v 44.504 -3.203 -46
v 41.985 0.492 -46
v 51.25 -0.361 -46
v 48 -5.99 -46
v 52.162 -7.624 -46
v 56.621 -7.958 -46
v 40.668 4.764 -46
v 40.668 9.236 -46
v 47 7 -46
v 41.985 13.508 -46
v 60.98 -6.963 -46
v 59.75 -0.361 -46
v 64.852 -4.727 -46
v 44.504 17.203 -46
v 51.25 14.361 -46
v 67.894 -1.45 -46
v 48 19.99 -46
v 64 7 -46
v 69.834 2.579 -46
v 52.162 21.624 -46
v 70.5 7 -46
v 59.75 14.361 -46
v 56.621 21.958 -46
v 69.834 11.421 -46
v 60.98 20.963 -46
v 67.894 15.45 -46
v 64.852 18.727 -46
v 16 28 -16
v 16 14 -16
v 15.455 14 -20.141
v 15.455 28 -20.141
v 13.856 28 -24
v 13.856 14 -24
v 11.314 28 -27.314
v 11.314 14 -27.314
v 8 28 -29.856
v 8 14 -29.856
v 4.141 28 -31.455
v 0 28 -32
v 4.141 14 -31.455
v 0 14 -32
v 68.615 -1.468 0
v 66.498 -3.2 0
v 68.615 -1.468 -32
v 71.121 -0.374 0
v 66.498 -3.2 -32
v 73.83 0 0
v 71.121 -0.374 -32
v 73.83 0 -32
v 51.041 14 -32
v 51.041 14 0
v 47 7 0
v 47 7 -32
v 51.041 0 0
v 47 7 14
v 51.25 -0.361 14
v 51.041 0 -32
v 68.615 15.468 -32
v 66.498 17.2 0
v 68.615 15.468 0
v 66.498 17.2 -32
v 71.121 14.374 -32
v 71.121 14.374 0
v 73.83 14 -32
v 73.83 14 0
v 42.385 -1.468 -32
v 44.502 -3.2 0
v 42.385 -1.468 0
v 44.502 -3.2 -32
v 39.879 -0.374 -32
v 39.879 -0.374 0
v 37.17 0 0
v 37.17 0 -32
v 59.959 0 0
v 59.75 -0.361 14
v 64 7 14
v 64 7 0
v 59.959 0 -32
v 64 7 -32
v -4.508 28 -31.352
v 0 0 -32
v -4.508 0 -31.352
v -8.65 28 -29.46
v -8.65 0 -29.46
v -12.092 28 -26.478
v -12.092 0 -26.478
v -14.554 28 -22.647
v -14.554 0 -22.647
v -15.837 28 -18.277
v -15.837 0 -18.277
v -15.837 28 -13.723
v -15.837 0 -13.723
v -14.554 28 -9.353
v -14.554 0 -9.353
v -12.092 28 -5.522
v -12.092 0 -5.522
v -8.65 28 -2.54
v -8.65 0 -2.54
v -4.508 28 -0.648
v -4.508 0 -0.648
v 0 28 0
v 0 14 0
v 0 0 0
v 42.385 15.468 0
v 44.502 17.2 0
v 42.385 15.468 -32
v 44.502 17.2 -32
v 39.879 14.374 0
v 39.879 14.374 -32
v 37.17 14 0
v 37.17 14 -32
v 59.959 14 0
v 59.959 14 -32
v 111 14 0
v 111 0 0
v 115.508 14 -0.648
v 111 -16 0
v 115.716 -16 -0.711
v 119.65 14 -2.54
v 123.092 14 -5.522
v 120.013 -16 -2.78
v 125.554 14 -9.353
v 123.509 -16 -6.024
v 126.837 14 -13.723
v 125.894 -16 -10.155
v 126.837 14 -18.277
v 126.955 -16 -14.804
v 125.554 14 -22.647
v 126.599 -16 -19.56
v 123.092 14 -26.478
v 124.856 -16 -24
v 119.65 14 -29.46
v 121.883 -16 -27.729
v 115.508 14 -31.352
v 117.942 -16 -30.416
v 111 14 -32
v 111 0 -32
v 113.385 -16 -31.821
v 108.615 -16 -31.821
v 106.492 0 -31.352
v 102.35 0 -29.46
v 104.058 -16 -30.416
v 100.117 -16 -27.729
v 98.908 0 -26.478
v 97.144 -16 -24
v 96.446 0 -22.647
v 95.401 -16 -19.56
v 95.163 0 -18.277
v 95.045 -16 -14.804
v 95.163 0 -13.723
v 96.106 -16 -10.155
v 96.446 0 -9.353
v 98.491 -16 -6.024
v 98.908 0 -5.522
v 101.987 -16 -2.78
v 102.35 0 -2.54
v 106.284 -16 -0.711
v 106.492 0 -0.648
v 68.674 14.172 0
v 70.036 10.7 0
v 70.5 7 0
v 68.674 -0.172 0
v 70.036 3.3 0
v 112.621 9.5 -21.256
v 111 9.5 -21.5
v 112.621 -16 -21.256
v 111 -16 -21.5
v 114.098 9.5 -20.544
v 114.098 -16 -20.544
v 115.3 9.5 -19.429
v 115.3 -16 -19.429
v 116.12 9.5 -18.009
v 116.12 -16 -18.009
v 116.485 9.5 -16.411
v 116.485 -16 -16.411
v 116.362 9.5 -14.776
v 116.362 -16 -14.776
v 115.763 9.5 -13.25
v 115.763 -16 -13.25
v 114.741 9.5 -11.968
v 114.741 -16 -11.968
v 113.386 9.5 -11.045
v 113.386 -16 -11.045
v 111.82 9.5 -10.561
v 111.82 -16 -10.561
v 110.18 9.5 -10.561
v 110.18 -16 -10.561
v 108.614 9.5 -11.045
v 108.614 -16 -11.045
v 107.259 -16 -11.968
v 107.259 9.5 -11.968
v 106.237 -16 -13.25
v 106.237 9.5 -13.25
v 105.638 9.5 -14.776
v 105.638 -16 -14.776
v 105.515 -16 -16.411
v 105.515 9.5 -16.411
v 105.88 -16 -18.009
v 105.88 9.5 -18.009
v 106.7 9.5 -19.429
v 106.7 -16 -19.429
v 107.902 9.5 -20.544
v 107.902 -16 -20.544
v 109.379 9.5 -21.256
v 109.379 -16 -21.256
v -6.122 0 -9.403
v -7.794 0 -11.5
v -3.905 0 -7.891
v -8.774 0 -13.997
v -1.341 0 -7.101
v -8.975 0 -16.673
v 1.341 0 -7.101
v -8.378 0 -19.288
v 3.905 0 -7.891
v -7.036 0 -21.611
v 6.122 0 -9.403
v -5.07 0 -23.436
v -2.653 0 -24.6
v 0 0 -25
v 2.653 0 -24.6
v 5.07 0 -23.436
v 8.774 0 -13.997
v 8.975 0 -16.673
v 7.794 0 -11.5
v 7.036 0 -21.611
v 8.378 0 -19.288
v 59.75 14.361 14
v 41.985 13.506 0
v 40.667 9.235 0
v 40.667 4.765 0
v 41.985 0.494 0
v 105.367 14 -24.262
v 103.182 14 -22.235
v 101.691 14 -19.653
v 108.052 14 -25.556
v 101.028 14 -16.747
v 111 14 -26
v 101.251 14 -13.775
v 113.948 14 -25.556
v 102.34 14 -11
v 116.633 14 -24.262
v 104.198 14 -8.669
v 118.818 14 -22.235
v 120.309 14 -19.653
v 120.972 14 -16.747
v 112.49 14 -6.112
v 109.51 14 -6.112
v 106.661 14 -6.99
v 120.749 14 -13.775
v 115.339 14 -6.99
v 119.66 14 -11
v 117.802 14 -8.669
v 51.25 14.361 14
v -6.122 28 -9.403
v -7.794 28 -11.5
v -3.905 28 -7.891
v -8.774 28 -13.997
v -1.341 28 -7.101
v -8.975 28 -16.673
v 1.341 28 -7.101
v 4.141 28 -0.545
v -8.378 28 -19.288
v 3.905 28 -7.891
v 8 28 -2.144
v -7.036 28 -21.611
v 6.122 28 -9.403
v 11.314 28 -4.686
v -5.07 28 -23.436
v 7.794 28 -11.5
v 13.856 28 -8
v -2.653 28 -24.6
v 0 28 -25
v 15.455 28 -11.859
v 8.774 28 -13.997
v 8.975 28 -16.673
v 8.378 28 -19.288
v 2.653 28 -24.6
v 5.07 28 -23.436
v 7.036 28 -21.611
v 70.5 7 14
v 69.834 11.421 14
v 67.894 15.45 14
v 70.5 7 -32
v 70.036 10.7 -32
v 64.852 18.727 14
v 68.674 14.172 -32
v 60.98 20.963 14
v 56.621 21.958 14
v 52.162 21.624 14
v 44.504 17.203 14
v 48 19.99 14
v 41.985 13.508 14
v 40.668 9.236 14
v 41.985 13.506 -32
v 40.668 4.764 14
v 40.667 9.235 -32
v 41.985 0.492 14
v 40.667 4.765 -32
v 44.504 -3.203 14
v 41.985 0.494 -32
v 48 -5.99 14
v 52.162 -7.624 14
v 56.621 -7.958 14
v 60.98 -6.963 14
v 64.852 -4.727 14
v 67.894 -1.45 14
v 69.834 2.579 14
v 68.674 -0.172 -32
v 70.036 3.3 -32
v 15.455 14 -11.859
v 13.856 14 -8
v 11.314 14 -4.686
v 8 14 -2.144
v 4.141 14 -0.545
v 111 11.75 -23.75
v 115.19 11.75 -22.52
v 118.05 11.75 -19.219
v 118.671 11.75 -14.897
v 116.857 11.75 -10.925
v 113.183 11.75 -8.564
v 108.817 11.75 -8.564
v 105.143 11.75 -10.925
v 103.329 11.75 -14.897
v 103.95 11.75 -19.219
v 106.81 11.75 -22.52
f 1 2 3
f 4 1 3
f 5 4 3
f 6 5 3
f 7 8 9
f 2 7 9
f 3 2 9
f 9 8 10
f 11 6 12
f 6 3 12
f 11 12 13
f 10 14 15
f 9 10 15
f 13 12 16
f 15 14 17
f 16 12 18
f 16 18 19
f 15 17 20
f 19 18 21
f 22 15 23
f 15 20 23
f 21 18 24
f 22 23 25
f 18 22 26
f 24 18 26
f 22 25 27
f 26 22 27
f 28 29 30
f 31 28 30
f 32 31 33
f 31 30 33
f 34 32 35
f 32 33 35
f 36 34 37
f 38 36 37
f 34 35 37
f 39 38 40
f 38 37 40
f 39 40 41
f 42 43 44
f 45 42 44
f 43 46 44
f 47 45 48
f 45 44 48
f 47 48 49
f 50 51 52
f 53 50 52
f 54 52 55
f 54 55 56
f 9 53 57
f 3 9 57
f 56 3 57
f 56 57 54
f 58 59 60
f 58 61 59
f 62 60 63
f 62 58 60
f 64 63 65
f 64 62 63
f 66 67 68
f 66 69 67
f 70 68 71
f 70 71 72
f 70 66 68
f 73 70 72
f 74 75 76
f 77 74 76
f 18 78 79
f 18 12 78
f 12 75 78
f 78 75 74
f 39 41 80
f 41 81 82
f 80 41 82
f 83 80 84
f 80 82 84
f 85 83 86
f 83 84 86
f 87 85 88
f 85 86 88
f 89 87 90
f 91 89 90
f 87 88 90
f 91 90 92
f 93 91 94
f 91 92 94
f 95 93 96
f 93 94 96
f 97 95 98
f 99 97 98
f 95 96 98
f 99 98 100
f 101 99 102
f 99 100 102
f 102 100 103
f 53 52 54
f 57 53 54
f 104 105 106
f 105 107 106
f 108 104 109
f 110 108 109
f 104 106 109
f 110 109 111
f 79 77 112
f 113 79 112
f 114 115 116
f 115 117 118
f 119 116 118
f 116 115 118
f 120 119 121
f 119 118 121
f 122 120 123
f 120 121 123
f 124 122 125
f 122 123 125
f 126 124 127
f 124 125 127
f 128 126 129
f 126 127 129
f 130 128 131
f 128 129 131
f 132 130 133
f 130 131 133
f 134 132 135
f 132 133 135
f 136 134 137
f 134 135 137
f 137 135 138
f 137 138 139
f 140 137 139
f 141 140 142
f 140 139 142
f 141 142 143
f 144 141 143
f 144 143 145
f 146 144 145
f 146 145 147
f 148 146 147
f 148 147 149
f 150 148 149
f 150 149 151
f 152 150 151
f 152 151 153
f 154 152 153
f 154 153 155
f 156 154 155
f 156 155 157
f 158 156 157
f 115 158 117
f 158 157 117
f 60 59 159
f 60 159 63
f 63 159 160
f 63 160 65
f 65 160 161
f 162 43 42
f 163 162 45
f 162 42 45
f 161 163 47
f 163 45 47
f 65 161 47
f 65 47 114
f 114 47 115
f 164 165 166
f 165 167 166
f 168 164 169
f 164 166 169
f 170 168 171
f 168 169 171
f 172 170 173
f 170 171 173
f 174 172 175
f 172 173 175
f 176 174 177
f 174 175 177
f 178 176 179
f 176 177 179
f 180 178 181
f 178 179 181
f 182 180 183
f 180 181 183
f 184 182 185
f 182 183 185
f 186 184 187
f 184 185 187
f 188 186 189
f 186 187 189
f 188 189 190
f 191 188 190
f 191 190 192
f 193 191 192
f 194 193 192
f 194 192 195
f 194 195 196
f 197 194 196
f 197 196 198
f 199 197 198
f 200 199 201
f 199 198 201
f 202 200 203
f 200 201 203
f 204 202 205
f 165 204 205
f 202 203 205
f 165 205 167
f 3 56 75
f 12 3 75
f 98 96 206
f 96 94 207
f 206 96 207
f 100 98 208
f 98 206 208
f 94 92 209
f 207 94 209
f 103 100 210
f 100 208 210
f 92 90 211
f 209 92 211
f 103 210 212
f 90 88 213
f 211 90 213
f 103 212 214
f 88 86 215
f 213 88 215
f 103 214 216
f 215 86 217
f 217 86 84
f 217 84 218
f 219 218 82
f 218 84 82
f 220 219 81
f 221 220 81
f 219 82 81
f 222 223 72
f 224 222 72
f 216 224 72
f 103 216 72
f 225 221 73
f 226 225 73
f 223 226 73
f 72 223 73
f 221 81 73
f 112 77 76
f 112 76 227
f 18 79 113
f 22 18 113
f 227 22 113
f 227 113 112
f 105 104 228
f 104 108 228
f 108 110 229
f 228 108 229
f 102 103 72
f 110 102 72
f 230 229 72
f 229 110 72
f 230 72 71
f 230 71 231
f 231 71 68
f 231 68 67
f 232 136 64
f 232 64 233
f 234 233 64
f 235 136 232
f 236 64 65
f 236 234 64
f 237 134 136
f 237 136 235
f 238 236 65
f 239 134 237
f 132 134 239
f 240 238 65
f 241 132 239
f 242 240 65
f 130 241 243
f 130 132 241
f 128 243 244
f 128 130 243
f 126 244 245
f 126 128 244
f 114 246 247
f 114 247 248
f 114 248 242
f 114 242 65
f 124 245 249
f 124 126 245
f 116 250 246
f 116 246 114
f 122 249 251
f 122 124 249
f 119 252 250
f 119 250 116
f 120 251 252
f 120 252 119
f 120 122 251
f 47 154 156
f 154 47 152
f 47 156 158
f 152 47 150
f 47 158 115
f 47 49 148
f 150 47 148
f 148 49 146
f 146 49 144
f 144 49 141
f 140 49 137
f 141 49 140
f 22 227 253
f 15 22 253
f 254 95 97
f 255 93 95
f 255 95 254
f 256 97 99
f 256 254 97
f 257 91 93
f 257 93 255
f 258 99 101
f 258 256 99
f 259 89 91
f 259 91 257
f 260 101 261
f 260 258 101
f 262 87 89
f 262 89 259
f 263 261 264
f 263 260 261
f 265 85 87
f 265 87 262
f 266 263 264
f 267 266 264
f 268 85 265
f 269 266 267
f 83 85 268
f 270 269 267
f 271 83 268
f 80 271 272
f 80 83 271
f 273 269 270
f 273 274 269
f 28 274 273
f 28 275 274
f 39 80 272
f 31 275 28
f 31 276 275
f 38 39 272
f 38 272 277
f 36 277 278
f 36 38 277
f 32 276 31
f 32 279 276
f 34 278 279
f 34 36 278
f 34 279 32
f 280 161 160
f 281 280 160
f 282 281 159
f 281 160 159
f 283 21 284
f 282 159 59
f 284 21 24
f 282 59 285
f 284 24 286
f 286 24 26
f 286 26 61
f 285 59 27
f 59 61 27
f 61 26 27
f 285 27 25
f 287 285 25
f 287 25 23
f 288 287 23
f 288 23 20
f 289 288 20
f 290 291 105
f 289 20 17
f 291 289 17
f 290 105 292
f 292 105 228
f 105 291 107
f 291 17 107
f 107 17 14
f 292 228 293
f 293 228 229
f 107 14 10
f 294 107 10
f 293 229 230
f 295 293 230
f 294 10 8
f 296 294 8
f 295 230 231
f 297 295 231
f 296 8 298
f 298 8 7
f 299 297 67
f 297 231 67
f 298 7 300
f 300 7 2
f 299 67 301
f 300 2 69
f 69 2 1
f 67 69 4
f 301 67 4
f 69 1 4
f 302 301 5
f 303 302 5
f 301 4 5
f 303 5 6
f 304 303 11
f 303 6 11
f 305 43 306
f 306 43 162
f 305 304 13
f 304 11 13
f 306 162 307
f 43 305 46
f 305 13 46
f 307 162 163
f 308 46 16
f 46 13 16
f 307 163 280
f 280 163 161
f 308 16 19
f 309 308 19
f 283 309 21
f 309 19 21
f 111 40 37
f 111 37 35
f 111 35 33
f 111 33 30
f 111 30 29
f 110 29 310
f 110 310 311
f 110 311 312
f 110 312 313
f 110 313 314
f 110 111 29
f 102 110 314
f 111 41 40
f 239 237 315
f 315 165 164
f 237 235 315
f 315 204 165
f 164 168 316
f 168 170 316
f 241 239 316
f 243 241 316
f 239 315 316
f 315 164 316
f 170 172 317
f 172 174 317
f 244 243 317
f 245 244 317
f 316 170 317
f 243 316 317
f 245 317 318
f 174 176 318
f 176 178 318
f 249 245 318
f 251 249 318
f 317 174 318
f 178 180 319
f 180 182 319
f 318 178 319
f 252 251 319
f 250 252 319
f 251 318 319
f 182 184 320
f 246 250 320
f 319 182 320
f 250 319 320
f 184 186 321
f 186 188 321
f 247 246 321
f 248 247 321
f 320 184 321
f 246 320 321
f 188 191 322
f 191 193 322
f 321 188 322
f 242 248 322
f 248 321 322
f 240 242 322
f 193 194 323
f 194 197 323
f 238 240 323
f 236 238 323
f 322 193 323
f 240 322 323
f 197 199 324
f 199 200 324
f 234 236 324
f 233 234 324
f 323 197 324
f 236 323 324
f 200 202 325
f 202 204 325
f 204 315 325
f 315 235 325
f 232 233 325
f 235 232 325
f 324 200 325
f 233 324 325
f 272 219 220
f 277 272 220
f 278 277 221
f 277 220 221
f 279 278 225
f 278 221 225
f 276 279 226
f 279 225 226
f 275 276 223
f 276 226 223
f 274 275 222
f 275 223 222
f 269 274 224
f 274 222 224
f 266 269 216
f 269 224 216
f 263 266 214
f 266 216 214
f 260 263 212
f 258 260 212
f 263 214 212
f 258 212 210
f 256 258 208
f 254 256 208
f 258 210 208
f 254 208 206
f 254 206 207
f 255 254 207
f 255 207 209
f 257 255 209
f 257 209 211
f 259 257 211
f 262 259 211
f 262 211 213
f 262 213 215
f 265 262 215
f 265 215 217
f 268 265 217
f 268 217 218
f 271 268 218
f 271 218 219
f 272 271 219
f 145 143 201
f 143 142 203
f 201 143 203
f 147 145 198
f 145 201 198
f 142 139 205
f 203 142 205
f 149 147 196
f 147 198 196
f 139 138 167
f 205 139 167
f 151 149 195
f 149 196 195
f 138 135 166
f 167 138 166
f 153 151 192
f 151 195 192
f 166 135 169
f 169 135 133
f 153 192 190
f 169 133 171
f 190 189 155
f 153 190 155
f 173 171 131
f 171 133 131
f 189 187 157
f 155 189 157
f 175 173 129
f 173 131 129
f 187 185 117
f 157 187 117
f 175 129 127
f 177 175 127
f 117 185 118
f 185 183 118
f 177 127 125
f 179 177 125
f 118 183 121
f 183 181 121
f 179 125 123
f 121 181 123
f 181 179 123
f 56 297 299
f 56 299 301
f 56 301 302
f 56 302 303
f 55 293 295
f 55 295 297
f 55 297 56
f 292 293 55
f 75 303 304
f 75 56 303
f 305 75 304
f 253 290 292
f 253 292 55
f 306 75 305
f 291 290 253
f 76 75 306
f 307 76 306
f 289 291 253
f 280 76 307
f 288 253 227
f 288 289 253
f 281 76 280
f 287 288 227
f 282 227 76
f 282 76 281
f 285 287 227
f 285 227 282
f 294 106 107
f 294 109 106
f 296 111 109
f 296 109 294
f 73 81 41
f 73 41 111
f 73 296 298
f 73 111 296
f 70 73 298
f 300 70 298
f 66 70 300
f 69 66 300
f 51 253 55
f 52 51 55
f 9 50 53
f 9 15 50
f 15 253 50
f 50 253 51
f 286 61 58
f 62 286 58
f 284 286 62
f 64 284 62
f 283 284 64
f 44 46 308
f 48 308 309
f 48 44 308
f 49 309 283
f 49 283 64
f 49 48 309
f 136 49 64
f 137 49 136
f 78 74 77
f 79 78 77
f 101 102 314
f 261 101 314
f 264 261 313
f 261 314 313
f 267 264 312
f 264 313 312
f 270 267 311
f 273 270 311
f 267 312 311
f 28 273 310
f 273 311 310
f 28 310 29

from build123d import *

# Parameters (mm, degrees)
SKETCH1_W                                        = 111
SKETCH1_H                                        = 32
BOSS_EXTRUDE1_DEPTH                              = 14
BOSS_EXTRUDE2_DEPTH                              = 28
BOSS_EXTRUDE3_DEPTH                              = 14
BOSS_EXTRUDE3_DEPTH_BACK                         = 16
SKETCH1_4_R                                      = 16
F_18_0_18_DIAMETER_HOLE1_D                       = 18
CSK_FOR_M10_FLAT_HEAD_MACHINE_SCREW1_D           = 11
CSK_FOR_M10_FLAT_HEAD_MACHINE_SCREW1_CSINK_D     = 20
CSK_FOR_M10_FLAT_HEAD_MACHINE_SCREW1_CSINK_ANGLE = 90
BOSS_EXTRUDE5_DEPTH                              = 14
BOSS_EXTRUDE5_DEPTH_BACK                         = 46
SKETCH4_R                                        = 15
CUT_EXTRUDE2_DEPTH                               = 32
FILLET1_R                                        = 10


with BuildPart() as part:
    # Sketch1 → Boss-Extrude1 (new body)
    with BuildSketch(Plane(origin=(0, 0, 0), x_dir=(1, 0, 0), z_dir=(0, 1, 0))):
        with Locations((55.5, 16)):
            Rectangle(SKETCH1_W, SKETCH1_H)
    extrude(amount=BOSS_EXTRUDE1_DEPTH)

    # Sketch1<3> → Boss-Extrude2 (add)
    with BuildSketch(Plane(origin=(0, 0, 0), x_dir=(1, 0, 0), z_dir=(0, 1, 0))):
        with BuildLine():
            ThreePointArc((0, 32), (-16, 16), (0, 0))
            Line((0, 0), (0, 32))
        make_face()
        with BuildLine():
            Line((0, 32), (0, 0))
            ThreePointArc((0, 0), (11.313708499, 4.686291501), (16, 16))
            ThreePointArc((16, 16), (11.313708499, 27.313708499), (0, 32))
        make_face()
    extrude(amount=BOSS_EXTRUDE2_DEPTH)

    # Sketch1<4> → Boss-Extrude3 (add, two sides: drawn at the far end of the back side and taken through both)
    with BuildSketch(Plane(origin=(0, 0, 0), x_dir=(1, 0, 0), z_dir=(0, 1, 0)).offset(-BOSS_EXTRUDE3_DEPTH_BACK)):
        with Locations(Location((111, 16, 0), (0, 0, 270))):
            Circle(SKETCH1_4_R)
    extrude(amount=BOSS_EXTRUDE3_DEPTH + BOSS_EXTRUDE3_DEPTH_BACK)

    # Ø18.0 (18) Diameter Hole1 (through all)
    with Locations(Plane(origin=(0, 28, -16), x_dir=(0, 0, 1), z_dir=(0, 1, 0))):
        with Locations((0, 0)):
            Hole(F_18_0_18_DIAMETER_HOLE1_D / 2)

    # CSK for M10 Flat Head Machine Screw1 (through all)
    with Locations(Plane(origin=(111, 14, -16), x_dir=(0, 0, 1), z_dir=(0, 1, 0))):
        with Locations((0, 0)):
            CounterSinkHole(CSK_FOR_M10_FLAT_HEAD_MACHINE_SCREW1_D / 2, CSK_FOR_M10_FLAT_HEAD_MACHINE_SCREW1_CSINK_D / 2, counter_sink_angle=CSK_FOR_M10_FLAT_HEAD_MACHINE_SCREW1_CSINK_ANGLE)

    # Sketch4 → Boss-Extrude5 (add, two sides: drawn at the far end of the back side and taken through both)
    with BuildSketch(Plane.XY.offset(-BOSS_EXTRUDE5_DEPTH_BACK)):
        with Locations((55.5, 7)):
            Circle(SKETCH4_R)
        Polygon((64, 7), (59.75, 14.361215932), (51.25, 14.361215932), (47, 7), (51.25, -0.361215932), (59.75, -0.361215932), align=None, mode=Mode.SUBTRACT)
    extrude(amount=BOSS_EXTRUDE5_DEPTH + BOSS_EXTRUDE5_DEPTH_BACK)

    # Sketch4<3> → Cut-Extrude2 (cut)
    with BuildSketch(Plane.XY):
        Polygon((59.958548116, 0), (64, 7), (59.958548116, 14), (51.041451884, 14), (47, 7), (51.041451884, 0), align=None)
    extrude(amount=-CUT_EXTRUDE2_DEPTH, mode=Mode.SUBTRACT)

    # Fillet1
    fillet1_edges = [part.edges().sort_by_distance(p)[0] for p in [
        (42.233500839, 0, -16),
        (68.766499161, 0, -16),
        (68.766499161, 14, -16),
        (42.233500839, 14, -16),
    ]]
    fillet(fillet1_edges, radius=FILLET1_R)


solid = part.part
